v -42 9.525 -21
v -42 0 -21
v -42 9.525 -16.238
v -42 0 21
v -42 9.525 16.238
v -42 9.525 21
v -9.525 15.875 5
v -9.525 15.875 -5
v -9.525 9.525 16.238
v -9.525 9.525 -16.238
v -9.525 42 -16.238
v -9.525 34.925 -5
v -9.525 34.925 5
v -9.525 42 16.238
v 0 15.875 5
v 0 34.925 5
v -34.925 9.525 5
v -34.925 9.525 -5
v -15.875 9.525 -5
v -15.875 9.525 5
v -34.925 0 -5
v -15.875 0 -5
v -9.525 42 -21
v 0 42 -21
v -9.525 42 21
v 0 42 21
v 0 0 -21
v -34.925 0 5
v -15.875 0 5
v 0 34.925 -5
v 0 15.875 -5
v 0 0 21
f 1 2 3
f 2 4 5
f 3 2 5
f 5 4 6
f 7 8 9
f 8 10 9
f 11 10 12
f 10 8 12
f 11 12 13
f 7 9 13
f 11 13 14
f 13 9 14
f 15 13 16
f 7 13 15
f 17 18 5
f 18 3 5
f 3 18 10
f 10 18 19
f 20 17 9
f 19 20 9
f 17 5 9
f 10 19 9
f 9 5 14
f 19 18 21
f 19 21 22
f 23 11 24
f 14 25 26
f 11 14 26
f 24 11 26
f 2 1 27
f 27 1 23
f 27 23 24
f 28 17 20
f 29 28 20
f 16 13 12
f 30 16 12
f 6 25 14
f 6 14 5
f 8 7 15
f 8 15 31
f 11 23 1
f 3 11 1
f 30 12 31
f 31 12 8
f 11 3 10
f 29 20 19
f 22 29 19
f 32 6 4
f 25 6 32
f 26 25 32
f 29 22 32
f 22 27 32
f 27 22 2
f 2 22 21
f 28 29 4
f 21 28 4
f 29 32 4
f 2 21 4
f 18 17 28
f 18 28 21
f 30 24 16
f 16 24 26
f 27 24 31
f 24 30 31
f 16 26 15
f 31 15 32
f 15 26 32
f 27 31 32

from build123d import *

# Parameters (mm, degrees)
BOSS_EXTRUDE1_DEPTH = 21
BOSS_EXTRUDE2_DEPTH = 4.7625
SKETCH3_W           = 19.05
SKETCH3_H           = 10
CUT_EXTRUDE1_DEPTH  = 10.525


with BuildPart() as part:
    # Sketch1 → Boss-Extrude1 (new body)
    with BuildSketch(Plane.XY):
        Polygon((0, 0), (-42, 0), (-42, 9.525), (-9.525, 9.525), (-9.525, 42), (0, 42), align=None)
    boss_extrude1 = extrude(amount=BOSS_EXTRUDE1_DEPTH)

    # Sketch2 → Boss-Extrude2 (add)
    with BuildSketch(Plane.XY.offset(21)):
        Polygon((-9.525, 42), (-42, 9.525), (-9.525, 9.525), align=None)
    boss_extrude2 = extrude(amount=-BOSS_EXTRUDE2_DEPTH)

    # Mirror1: Boss-Extrude1, Boss-Extrude2 across plane
    add(boss_extrude1.mirror(Plane(origin=(0, 0, 0), x_dir=(1, 0, 0), z_dir=(0, 0, -1))))
    add(boss_extrude2.mirror(Plane(origin=(0, 0, 0), x_dir=(1, 0, 0), z_dir=(0, 0, -1))))

    # Sketch3 → Cut-Extrude1 (cut, through all)
    with BuildSketch(Plane(origin=(0, 9.525, 0), x_dir=(1, 0, 0), z_dir=(0, 1, 0))):
        with Locations((-25.4, 0)):
            Rectangle(SKETCH3_W, SKETCH3_H)
    cut_extrude1 = extrude(amount=-CUT_EXTRUDE1_DEPTH, mode=Mode.SUBTRACT)

    # Mirror2: Cut-Extrude1 across plane
    add(cut_extrude1.mirror(Plane(origin=(0, 0, 0), x_dir=(0, 0, 1), z_dir=(0.707106781, 0.707106781, 0))), mode=Mode.SUBTRACT)


solid = part.part
